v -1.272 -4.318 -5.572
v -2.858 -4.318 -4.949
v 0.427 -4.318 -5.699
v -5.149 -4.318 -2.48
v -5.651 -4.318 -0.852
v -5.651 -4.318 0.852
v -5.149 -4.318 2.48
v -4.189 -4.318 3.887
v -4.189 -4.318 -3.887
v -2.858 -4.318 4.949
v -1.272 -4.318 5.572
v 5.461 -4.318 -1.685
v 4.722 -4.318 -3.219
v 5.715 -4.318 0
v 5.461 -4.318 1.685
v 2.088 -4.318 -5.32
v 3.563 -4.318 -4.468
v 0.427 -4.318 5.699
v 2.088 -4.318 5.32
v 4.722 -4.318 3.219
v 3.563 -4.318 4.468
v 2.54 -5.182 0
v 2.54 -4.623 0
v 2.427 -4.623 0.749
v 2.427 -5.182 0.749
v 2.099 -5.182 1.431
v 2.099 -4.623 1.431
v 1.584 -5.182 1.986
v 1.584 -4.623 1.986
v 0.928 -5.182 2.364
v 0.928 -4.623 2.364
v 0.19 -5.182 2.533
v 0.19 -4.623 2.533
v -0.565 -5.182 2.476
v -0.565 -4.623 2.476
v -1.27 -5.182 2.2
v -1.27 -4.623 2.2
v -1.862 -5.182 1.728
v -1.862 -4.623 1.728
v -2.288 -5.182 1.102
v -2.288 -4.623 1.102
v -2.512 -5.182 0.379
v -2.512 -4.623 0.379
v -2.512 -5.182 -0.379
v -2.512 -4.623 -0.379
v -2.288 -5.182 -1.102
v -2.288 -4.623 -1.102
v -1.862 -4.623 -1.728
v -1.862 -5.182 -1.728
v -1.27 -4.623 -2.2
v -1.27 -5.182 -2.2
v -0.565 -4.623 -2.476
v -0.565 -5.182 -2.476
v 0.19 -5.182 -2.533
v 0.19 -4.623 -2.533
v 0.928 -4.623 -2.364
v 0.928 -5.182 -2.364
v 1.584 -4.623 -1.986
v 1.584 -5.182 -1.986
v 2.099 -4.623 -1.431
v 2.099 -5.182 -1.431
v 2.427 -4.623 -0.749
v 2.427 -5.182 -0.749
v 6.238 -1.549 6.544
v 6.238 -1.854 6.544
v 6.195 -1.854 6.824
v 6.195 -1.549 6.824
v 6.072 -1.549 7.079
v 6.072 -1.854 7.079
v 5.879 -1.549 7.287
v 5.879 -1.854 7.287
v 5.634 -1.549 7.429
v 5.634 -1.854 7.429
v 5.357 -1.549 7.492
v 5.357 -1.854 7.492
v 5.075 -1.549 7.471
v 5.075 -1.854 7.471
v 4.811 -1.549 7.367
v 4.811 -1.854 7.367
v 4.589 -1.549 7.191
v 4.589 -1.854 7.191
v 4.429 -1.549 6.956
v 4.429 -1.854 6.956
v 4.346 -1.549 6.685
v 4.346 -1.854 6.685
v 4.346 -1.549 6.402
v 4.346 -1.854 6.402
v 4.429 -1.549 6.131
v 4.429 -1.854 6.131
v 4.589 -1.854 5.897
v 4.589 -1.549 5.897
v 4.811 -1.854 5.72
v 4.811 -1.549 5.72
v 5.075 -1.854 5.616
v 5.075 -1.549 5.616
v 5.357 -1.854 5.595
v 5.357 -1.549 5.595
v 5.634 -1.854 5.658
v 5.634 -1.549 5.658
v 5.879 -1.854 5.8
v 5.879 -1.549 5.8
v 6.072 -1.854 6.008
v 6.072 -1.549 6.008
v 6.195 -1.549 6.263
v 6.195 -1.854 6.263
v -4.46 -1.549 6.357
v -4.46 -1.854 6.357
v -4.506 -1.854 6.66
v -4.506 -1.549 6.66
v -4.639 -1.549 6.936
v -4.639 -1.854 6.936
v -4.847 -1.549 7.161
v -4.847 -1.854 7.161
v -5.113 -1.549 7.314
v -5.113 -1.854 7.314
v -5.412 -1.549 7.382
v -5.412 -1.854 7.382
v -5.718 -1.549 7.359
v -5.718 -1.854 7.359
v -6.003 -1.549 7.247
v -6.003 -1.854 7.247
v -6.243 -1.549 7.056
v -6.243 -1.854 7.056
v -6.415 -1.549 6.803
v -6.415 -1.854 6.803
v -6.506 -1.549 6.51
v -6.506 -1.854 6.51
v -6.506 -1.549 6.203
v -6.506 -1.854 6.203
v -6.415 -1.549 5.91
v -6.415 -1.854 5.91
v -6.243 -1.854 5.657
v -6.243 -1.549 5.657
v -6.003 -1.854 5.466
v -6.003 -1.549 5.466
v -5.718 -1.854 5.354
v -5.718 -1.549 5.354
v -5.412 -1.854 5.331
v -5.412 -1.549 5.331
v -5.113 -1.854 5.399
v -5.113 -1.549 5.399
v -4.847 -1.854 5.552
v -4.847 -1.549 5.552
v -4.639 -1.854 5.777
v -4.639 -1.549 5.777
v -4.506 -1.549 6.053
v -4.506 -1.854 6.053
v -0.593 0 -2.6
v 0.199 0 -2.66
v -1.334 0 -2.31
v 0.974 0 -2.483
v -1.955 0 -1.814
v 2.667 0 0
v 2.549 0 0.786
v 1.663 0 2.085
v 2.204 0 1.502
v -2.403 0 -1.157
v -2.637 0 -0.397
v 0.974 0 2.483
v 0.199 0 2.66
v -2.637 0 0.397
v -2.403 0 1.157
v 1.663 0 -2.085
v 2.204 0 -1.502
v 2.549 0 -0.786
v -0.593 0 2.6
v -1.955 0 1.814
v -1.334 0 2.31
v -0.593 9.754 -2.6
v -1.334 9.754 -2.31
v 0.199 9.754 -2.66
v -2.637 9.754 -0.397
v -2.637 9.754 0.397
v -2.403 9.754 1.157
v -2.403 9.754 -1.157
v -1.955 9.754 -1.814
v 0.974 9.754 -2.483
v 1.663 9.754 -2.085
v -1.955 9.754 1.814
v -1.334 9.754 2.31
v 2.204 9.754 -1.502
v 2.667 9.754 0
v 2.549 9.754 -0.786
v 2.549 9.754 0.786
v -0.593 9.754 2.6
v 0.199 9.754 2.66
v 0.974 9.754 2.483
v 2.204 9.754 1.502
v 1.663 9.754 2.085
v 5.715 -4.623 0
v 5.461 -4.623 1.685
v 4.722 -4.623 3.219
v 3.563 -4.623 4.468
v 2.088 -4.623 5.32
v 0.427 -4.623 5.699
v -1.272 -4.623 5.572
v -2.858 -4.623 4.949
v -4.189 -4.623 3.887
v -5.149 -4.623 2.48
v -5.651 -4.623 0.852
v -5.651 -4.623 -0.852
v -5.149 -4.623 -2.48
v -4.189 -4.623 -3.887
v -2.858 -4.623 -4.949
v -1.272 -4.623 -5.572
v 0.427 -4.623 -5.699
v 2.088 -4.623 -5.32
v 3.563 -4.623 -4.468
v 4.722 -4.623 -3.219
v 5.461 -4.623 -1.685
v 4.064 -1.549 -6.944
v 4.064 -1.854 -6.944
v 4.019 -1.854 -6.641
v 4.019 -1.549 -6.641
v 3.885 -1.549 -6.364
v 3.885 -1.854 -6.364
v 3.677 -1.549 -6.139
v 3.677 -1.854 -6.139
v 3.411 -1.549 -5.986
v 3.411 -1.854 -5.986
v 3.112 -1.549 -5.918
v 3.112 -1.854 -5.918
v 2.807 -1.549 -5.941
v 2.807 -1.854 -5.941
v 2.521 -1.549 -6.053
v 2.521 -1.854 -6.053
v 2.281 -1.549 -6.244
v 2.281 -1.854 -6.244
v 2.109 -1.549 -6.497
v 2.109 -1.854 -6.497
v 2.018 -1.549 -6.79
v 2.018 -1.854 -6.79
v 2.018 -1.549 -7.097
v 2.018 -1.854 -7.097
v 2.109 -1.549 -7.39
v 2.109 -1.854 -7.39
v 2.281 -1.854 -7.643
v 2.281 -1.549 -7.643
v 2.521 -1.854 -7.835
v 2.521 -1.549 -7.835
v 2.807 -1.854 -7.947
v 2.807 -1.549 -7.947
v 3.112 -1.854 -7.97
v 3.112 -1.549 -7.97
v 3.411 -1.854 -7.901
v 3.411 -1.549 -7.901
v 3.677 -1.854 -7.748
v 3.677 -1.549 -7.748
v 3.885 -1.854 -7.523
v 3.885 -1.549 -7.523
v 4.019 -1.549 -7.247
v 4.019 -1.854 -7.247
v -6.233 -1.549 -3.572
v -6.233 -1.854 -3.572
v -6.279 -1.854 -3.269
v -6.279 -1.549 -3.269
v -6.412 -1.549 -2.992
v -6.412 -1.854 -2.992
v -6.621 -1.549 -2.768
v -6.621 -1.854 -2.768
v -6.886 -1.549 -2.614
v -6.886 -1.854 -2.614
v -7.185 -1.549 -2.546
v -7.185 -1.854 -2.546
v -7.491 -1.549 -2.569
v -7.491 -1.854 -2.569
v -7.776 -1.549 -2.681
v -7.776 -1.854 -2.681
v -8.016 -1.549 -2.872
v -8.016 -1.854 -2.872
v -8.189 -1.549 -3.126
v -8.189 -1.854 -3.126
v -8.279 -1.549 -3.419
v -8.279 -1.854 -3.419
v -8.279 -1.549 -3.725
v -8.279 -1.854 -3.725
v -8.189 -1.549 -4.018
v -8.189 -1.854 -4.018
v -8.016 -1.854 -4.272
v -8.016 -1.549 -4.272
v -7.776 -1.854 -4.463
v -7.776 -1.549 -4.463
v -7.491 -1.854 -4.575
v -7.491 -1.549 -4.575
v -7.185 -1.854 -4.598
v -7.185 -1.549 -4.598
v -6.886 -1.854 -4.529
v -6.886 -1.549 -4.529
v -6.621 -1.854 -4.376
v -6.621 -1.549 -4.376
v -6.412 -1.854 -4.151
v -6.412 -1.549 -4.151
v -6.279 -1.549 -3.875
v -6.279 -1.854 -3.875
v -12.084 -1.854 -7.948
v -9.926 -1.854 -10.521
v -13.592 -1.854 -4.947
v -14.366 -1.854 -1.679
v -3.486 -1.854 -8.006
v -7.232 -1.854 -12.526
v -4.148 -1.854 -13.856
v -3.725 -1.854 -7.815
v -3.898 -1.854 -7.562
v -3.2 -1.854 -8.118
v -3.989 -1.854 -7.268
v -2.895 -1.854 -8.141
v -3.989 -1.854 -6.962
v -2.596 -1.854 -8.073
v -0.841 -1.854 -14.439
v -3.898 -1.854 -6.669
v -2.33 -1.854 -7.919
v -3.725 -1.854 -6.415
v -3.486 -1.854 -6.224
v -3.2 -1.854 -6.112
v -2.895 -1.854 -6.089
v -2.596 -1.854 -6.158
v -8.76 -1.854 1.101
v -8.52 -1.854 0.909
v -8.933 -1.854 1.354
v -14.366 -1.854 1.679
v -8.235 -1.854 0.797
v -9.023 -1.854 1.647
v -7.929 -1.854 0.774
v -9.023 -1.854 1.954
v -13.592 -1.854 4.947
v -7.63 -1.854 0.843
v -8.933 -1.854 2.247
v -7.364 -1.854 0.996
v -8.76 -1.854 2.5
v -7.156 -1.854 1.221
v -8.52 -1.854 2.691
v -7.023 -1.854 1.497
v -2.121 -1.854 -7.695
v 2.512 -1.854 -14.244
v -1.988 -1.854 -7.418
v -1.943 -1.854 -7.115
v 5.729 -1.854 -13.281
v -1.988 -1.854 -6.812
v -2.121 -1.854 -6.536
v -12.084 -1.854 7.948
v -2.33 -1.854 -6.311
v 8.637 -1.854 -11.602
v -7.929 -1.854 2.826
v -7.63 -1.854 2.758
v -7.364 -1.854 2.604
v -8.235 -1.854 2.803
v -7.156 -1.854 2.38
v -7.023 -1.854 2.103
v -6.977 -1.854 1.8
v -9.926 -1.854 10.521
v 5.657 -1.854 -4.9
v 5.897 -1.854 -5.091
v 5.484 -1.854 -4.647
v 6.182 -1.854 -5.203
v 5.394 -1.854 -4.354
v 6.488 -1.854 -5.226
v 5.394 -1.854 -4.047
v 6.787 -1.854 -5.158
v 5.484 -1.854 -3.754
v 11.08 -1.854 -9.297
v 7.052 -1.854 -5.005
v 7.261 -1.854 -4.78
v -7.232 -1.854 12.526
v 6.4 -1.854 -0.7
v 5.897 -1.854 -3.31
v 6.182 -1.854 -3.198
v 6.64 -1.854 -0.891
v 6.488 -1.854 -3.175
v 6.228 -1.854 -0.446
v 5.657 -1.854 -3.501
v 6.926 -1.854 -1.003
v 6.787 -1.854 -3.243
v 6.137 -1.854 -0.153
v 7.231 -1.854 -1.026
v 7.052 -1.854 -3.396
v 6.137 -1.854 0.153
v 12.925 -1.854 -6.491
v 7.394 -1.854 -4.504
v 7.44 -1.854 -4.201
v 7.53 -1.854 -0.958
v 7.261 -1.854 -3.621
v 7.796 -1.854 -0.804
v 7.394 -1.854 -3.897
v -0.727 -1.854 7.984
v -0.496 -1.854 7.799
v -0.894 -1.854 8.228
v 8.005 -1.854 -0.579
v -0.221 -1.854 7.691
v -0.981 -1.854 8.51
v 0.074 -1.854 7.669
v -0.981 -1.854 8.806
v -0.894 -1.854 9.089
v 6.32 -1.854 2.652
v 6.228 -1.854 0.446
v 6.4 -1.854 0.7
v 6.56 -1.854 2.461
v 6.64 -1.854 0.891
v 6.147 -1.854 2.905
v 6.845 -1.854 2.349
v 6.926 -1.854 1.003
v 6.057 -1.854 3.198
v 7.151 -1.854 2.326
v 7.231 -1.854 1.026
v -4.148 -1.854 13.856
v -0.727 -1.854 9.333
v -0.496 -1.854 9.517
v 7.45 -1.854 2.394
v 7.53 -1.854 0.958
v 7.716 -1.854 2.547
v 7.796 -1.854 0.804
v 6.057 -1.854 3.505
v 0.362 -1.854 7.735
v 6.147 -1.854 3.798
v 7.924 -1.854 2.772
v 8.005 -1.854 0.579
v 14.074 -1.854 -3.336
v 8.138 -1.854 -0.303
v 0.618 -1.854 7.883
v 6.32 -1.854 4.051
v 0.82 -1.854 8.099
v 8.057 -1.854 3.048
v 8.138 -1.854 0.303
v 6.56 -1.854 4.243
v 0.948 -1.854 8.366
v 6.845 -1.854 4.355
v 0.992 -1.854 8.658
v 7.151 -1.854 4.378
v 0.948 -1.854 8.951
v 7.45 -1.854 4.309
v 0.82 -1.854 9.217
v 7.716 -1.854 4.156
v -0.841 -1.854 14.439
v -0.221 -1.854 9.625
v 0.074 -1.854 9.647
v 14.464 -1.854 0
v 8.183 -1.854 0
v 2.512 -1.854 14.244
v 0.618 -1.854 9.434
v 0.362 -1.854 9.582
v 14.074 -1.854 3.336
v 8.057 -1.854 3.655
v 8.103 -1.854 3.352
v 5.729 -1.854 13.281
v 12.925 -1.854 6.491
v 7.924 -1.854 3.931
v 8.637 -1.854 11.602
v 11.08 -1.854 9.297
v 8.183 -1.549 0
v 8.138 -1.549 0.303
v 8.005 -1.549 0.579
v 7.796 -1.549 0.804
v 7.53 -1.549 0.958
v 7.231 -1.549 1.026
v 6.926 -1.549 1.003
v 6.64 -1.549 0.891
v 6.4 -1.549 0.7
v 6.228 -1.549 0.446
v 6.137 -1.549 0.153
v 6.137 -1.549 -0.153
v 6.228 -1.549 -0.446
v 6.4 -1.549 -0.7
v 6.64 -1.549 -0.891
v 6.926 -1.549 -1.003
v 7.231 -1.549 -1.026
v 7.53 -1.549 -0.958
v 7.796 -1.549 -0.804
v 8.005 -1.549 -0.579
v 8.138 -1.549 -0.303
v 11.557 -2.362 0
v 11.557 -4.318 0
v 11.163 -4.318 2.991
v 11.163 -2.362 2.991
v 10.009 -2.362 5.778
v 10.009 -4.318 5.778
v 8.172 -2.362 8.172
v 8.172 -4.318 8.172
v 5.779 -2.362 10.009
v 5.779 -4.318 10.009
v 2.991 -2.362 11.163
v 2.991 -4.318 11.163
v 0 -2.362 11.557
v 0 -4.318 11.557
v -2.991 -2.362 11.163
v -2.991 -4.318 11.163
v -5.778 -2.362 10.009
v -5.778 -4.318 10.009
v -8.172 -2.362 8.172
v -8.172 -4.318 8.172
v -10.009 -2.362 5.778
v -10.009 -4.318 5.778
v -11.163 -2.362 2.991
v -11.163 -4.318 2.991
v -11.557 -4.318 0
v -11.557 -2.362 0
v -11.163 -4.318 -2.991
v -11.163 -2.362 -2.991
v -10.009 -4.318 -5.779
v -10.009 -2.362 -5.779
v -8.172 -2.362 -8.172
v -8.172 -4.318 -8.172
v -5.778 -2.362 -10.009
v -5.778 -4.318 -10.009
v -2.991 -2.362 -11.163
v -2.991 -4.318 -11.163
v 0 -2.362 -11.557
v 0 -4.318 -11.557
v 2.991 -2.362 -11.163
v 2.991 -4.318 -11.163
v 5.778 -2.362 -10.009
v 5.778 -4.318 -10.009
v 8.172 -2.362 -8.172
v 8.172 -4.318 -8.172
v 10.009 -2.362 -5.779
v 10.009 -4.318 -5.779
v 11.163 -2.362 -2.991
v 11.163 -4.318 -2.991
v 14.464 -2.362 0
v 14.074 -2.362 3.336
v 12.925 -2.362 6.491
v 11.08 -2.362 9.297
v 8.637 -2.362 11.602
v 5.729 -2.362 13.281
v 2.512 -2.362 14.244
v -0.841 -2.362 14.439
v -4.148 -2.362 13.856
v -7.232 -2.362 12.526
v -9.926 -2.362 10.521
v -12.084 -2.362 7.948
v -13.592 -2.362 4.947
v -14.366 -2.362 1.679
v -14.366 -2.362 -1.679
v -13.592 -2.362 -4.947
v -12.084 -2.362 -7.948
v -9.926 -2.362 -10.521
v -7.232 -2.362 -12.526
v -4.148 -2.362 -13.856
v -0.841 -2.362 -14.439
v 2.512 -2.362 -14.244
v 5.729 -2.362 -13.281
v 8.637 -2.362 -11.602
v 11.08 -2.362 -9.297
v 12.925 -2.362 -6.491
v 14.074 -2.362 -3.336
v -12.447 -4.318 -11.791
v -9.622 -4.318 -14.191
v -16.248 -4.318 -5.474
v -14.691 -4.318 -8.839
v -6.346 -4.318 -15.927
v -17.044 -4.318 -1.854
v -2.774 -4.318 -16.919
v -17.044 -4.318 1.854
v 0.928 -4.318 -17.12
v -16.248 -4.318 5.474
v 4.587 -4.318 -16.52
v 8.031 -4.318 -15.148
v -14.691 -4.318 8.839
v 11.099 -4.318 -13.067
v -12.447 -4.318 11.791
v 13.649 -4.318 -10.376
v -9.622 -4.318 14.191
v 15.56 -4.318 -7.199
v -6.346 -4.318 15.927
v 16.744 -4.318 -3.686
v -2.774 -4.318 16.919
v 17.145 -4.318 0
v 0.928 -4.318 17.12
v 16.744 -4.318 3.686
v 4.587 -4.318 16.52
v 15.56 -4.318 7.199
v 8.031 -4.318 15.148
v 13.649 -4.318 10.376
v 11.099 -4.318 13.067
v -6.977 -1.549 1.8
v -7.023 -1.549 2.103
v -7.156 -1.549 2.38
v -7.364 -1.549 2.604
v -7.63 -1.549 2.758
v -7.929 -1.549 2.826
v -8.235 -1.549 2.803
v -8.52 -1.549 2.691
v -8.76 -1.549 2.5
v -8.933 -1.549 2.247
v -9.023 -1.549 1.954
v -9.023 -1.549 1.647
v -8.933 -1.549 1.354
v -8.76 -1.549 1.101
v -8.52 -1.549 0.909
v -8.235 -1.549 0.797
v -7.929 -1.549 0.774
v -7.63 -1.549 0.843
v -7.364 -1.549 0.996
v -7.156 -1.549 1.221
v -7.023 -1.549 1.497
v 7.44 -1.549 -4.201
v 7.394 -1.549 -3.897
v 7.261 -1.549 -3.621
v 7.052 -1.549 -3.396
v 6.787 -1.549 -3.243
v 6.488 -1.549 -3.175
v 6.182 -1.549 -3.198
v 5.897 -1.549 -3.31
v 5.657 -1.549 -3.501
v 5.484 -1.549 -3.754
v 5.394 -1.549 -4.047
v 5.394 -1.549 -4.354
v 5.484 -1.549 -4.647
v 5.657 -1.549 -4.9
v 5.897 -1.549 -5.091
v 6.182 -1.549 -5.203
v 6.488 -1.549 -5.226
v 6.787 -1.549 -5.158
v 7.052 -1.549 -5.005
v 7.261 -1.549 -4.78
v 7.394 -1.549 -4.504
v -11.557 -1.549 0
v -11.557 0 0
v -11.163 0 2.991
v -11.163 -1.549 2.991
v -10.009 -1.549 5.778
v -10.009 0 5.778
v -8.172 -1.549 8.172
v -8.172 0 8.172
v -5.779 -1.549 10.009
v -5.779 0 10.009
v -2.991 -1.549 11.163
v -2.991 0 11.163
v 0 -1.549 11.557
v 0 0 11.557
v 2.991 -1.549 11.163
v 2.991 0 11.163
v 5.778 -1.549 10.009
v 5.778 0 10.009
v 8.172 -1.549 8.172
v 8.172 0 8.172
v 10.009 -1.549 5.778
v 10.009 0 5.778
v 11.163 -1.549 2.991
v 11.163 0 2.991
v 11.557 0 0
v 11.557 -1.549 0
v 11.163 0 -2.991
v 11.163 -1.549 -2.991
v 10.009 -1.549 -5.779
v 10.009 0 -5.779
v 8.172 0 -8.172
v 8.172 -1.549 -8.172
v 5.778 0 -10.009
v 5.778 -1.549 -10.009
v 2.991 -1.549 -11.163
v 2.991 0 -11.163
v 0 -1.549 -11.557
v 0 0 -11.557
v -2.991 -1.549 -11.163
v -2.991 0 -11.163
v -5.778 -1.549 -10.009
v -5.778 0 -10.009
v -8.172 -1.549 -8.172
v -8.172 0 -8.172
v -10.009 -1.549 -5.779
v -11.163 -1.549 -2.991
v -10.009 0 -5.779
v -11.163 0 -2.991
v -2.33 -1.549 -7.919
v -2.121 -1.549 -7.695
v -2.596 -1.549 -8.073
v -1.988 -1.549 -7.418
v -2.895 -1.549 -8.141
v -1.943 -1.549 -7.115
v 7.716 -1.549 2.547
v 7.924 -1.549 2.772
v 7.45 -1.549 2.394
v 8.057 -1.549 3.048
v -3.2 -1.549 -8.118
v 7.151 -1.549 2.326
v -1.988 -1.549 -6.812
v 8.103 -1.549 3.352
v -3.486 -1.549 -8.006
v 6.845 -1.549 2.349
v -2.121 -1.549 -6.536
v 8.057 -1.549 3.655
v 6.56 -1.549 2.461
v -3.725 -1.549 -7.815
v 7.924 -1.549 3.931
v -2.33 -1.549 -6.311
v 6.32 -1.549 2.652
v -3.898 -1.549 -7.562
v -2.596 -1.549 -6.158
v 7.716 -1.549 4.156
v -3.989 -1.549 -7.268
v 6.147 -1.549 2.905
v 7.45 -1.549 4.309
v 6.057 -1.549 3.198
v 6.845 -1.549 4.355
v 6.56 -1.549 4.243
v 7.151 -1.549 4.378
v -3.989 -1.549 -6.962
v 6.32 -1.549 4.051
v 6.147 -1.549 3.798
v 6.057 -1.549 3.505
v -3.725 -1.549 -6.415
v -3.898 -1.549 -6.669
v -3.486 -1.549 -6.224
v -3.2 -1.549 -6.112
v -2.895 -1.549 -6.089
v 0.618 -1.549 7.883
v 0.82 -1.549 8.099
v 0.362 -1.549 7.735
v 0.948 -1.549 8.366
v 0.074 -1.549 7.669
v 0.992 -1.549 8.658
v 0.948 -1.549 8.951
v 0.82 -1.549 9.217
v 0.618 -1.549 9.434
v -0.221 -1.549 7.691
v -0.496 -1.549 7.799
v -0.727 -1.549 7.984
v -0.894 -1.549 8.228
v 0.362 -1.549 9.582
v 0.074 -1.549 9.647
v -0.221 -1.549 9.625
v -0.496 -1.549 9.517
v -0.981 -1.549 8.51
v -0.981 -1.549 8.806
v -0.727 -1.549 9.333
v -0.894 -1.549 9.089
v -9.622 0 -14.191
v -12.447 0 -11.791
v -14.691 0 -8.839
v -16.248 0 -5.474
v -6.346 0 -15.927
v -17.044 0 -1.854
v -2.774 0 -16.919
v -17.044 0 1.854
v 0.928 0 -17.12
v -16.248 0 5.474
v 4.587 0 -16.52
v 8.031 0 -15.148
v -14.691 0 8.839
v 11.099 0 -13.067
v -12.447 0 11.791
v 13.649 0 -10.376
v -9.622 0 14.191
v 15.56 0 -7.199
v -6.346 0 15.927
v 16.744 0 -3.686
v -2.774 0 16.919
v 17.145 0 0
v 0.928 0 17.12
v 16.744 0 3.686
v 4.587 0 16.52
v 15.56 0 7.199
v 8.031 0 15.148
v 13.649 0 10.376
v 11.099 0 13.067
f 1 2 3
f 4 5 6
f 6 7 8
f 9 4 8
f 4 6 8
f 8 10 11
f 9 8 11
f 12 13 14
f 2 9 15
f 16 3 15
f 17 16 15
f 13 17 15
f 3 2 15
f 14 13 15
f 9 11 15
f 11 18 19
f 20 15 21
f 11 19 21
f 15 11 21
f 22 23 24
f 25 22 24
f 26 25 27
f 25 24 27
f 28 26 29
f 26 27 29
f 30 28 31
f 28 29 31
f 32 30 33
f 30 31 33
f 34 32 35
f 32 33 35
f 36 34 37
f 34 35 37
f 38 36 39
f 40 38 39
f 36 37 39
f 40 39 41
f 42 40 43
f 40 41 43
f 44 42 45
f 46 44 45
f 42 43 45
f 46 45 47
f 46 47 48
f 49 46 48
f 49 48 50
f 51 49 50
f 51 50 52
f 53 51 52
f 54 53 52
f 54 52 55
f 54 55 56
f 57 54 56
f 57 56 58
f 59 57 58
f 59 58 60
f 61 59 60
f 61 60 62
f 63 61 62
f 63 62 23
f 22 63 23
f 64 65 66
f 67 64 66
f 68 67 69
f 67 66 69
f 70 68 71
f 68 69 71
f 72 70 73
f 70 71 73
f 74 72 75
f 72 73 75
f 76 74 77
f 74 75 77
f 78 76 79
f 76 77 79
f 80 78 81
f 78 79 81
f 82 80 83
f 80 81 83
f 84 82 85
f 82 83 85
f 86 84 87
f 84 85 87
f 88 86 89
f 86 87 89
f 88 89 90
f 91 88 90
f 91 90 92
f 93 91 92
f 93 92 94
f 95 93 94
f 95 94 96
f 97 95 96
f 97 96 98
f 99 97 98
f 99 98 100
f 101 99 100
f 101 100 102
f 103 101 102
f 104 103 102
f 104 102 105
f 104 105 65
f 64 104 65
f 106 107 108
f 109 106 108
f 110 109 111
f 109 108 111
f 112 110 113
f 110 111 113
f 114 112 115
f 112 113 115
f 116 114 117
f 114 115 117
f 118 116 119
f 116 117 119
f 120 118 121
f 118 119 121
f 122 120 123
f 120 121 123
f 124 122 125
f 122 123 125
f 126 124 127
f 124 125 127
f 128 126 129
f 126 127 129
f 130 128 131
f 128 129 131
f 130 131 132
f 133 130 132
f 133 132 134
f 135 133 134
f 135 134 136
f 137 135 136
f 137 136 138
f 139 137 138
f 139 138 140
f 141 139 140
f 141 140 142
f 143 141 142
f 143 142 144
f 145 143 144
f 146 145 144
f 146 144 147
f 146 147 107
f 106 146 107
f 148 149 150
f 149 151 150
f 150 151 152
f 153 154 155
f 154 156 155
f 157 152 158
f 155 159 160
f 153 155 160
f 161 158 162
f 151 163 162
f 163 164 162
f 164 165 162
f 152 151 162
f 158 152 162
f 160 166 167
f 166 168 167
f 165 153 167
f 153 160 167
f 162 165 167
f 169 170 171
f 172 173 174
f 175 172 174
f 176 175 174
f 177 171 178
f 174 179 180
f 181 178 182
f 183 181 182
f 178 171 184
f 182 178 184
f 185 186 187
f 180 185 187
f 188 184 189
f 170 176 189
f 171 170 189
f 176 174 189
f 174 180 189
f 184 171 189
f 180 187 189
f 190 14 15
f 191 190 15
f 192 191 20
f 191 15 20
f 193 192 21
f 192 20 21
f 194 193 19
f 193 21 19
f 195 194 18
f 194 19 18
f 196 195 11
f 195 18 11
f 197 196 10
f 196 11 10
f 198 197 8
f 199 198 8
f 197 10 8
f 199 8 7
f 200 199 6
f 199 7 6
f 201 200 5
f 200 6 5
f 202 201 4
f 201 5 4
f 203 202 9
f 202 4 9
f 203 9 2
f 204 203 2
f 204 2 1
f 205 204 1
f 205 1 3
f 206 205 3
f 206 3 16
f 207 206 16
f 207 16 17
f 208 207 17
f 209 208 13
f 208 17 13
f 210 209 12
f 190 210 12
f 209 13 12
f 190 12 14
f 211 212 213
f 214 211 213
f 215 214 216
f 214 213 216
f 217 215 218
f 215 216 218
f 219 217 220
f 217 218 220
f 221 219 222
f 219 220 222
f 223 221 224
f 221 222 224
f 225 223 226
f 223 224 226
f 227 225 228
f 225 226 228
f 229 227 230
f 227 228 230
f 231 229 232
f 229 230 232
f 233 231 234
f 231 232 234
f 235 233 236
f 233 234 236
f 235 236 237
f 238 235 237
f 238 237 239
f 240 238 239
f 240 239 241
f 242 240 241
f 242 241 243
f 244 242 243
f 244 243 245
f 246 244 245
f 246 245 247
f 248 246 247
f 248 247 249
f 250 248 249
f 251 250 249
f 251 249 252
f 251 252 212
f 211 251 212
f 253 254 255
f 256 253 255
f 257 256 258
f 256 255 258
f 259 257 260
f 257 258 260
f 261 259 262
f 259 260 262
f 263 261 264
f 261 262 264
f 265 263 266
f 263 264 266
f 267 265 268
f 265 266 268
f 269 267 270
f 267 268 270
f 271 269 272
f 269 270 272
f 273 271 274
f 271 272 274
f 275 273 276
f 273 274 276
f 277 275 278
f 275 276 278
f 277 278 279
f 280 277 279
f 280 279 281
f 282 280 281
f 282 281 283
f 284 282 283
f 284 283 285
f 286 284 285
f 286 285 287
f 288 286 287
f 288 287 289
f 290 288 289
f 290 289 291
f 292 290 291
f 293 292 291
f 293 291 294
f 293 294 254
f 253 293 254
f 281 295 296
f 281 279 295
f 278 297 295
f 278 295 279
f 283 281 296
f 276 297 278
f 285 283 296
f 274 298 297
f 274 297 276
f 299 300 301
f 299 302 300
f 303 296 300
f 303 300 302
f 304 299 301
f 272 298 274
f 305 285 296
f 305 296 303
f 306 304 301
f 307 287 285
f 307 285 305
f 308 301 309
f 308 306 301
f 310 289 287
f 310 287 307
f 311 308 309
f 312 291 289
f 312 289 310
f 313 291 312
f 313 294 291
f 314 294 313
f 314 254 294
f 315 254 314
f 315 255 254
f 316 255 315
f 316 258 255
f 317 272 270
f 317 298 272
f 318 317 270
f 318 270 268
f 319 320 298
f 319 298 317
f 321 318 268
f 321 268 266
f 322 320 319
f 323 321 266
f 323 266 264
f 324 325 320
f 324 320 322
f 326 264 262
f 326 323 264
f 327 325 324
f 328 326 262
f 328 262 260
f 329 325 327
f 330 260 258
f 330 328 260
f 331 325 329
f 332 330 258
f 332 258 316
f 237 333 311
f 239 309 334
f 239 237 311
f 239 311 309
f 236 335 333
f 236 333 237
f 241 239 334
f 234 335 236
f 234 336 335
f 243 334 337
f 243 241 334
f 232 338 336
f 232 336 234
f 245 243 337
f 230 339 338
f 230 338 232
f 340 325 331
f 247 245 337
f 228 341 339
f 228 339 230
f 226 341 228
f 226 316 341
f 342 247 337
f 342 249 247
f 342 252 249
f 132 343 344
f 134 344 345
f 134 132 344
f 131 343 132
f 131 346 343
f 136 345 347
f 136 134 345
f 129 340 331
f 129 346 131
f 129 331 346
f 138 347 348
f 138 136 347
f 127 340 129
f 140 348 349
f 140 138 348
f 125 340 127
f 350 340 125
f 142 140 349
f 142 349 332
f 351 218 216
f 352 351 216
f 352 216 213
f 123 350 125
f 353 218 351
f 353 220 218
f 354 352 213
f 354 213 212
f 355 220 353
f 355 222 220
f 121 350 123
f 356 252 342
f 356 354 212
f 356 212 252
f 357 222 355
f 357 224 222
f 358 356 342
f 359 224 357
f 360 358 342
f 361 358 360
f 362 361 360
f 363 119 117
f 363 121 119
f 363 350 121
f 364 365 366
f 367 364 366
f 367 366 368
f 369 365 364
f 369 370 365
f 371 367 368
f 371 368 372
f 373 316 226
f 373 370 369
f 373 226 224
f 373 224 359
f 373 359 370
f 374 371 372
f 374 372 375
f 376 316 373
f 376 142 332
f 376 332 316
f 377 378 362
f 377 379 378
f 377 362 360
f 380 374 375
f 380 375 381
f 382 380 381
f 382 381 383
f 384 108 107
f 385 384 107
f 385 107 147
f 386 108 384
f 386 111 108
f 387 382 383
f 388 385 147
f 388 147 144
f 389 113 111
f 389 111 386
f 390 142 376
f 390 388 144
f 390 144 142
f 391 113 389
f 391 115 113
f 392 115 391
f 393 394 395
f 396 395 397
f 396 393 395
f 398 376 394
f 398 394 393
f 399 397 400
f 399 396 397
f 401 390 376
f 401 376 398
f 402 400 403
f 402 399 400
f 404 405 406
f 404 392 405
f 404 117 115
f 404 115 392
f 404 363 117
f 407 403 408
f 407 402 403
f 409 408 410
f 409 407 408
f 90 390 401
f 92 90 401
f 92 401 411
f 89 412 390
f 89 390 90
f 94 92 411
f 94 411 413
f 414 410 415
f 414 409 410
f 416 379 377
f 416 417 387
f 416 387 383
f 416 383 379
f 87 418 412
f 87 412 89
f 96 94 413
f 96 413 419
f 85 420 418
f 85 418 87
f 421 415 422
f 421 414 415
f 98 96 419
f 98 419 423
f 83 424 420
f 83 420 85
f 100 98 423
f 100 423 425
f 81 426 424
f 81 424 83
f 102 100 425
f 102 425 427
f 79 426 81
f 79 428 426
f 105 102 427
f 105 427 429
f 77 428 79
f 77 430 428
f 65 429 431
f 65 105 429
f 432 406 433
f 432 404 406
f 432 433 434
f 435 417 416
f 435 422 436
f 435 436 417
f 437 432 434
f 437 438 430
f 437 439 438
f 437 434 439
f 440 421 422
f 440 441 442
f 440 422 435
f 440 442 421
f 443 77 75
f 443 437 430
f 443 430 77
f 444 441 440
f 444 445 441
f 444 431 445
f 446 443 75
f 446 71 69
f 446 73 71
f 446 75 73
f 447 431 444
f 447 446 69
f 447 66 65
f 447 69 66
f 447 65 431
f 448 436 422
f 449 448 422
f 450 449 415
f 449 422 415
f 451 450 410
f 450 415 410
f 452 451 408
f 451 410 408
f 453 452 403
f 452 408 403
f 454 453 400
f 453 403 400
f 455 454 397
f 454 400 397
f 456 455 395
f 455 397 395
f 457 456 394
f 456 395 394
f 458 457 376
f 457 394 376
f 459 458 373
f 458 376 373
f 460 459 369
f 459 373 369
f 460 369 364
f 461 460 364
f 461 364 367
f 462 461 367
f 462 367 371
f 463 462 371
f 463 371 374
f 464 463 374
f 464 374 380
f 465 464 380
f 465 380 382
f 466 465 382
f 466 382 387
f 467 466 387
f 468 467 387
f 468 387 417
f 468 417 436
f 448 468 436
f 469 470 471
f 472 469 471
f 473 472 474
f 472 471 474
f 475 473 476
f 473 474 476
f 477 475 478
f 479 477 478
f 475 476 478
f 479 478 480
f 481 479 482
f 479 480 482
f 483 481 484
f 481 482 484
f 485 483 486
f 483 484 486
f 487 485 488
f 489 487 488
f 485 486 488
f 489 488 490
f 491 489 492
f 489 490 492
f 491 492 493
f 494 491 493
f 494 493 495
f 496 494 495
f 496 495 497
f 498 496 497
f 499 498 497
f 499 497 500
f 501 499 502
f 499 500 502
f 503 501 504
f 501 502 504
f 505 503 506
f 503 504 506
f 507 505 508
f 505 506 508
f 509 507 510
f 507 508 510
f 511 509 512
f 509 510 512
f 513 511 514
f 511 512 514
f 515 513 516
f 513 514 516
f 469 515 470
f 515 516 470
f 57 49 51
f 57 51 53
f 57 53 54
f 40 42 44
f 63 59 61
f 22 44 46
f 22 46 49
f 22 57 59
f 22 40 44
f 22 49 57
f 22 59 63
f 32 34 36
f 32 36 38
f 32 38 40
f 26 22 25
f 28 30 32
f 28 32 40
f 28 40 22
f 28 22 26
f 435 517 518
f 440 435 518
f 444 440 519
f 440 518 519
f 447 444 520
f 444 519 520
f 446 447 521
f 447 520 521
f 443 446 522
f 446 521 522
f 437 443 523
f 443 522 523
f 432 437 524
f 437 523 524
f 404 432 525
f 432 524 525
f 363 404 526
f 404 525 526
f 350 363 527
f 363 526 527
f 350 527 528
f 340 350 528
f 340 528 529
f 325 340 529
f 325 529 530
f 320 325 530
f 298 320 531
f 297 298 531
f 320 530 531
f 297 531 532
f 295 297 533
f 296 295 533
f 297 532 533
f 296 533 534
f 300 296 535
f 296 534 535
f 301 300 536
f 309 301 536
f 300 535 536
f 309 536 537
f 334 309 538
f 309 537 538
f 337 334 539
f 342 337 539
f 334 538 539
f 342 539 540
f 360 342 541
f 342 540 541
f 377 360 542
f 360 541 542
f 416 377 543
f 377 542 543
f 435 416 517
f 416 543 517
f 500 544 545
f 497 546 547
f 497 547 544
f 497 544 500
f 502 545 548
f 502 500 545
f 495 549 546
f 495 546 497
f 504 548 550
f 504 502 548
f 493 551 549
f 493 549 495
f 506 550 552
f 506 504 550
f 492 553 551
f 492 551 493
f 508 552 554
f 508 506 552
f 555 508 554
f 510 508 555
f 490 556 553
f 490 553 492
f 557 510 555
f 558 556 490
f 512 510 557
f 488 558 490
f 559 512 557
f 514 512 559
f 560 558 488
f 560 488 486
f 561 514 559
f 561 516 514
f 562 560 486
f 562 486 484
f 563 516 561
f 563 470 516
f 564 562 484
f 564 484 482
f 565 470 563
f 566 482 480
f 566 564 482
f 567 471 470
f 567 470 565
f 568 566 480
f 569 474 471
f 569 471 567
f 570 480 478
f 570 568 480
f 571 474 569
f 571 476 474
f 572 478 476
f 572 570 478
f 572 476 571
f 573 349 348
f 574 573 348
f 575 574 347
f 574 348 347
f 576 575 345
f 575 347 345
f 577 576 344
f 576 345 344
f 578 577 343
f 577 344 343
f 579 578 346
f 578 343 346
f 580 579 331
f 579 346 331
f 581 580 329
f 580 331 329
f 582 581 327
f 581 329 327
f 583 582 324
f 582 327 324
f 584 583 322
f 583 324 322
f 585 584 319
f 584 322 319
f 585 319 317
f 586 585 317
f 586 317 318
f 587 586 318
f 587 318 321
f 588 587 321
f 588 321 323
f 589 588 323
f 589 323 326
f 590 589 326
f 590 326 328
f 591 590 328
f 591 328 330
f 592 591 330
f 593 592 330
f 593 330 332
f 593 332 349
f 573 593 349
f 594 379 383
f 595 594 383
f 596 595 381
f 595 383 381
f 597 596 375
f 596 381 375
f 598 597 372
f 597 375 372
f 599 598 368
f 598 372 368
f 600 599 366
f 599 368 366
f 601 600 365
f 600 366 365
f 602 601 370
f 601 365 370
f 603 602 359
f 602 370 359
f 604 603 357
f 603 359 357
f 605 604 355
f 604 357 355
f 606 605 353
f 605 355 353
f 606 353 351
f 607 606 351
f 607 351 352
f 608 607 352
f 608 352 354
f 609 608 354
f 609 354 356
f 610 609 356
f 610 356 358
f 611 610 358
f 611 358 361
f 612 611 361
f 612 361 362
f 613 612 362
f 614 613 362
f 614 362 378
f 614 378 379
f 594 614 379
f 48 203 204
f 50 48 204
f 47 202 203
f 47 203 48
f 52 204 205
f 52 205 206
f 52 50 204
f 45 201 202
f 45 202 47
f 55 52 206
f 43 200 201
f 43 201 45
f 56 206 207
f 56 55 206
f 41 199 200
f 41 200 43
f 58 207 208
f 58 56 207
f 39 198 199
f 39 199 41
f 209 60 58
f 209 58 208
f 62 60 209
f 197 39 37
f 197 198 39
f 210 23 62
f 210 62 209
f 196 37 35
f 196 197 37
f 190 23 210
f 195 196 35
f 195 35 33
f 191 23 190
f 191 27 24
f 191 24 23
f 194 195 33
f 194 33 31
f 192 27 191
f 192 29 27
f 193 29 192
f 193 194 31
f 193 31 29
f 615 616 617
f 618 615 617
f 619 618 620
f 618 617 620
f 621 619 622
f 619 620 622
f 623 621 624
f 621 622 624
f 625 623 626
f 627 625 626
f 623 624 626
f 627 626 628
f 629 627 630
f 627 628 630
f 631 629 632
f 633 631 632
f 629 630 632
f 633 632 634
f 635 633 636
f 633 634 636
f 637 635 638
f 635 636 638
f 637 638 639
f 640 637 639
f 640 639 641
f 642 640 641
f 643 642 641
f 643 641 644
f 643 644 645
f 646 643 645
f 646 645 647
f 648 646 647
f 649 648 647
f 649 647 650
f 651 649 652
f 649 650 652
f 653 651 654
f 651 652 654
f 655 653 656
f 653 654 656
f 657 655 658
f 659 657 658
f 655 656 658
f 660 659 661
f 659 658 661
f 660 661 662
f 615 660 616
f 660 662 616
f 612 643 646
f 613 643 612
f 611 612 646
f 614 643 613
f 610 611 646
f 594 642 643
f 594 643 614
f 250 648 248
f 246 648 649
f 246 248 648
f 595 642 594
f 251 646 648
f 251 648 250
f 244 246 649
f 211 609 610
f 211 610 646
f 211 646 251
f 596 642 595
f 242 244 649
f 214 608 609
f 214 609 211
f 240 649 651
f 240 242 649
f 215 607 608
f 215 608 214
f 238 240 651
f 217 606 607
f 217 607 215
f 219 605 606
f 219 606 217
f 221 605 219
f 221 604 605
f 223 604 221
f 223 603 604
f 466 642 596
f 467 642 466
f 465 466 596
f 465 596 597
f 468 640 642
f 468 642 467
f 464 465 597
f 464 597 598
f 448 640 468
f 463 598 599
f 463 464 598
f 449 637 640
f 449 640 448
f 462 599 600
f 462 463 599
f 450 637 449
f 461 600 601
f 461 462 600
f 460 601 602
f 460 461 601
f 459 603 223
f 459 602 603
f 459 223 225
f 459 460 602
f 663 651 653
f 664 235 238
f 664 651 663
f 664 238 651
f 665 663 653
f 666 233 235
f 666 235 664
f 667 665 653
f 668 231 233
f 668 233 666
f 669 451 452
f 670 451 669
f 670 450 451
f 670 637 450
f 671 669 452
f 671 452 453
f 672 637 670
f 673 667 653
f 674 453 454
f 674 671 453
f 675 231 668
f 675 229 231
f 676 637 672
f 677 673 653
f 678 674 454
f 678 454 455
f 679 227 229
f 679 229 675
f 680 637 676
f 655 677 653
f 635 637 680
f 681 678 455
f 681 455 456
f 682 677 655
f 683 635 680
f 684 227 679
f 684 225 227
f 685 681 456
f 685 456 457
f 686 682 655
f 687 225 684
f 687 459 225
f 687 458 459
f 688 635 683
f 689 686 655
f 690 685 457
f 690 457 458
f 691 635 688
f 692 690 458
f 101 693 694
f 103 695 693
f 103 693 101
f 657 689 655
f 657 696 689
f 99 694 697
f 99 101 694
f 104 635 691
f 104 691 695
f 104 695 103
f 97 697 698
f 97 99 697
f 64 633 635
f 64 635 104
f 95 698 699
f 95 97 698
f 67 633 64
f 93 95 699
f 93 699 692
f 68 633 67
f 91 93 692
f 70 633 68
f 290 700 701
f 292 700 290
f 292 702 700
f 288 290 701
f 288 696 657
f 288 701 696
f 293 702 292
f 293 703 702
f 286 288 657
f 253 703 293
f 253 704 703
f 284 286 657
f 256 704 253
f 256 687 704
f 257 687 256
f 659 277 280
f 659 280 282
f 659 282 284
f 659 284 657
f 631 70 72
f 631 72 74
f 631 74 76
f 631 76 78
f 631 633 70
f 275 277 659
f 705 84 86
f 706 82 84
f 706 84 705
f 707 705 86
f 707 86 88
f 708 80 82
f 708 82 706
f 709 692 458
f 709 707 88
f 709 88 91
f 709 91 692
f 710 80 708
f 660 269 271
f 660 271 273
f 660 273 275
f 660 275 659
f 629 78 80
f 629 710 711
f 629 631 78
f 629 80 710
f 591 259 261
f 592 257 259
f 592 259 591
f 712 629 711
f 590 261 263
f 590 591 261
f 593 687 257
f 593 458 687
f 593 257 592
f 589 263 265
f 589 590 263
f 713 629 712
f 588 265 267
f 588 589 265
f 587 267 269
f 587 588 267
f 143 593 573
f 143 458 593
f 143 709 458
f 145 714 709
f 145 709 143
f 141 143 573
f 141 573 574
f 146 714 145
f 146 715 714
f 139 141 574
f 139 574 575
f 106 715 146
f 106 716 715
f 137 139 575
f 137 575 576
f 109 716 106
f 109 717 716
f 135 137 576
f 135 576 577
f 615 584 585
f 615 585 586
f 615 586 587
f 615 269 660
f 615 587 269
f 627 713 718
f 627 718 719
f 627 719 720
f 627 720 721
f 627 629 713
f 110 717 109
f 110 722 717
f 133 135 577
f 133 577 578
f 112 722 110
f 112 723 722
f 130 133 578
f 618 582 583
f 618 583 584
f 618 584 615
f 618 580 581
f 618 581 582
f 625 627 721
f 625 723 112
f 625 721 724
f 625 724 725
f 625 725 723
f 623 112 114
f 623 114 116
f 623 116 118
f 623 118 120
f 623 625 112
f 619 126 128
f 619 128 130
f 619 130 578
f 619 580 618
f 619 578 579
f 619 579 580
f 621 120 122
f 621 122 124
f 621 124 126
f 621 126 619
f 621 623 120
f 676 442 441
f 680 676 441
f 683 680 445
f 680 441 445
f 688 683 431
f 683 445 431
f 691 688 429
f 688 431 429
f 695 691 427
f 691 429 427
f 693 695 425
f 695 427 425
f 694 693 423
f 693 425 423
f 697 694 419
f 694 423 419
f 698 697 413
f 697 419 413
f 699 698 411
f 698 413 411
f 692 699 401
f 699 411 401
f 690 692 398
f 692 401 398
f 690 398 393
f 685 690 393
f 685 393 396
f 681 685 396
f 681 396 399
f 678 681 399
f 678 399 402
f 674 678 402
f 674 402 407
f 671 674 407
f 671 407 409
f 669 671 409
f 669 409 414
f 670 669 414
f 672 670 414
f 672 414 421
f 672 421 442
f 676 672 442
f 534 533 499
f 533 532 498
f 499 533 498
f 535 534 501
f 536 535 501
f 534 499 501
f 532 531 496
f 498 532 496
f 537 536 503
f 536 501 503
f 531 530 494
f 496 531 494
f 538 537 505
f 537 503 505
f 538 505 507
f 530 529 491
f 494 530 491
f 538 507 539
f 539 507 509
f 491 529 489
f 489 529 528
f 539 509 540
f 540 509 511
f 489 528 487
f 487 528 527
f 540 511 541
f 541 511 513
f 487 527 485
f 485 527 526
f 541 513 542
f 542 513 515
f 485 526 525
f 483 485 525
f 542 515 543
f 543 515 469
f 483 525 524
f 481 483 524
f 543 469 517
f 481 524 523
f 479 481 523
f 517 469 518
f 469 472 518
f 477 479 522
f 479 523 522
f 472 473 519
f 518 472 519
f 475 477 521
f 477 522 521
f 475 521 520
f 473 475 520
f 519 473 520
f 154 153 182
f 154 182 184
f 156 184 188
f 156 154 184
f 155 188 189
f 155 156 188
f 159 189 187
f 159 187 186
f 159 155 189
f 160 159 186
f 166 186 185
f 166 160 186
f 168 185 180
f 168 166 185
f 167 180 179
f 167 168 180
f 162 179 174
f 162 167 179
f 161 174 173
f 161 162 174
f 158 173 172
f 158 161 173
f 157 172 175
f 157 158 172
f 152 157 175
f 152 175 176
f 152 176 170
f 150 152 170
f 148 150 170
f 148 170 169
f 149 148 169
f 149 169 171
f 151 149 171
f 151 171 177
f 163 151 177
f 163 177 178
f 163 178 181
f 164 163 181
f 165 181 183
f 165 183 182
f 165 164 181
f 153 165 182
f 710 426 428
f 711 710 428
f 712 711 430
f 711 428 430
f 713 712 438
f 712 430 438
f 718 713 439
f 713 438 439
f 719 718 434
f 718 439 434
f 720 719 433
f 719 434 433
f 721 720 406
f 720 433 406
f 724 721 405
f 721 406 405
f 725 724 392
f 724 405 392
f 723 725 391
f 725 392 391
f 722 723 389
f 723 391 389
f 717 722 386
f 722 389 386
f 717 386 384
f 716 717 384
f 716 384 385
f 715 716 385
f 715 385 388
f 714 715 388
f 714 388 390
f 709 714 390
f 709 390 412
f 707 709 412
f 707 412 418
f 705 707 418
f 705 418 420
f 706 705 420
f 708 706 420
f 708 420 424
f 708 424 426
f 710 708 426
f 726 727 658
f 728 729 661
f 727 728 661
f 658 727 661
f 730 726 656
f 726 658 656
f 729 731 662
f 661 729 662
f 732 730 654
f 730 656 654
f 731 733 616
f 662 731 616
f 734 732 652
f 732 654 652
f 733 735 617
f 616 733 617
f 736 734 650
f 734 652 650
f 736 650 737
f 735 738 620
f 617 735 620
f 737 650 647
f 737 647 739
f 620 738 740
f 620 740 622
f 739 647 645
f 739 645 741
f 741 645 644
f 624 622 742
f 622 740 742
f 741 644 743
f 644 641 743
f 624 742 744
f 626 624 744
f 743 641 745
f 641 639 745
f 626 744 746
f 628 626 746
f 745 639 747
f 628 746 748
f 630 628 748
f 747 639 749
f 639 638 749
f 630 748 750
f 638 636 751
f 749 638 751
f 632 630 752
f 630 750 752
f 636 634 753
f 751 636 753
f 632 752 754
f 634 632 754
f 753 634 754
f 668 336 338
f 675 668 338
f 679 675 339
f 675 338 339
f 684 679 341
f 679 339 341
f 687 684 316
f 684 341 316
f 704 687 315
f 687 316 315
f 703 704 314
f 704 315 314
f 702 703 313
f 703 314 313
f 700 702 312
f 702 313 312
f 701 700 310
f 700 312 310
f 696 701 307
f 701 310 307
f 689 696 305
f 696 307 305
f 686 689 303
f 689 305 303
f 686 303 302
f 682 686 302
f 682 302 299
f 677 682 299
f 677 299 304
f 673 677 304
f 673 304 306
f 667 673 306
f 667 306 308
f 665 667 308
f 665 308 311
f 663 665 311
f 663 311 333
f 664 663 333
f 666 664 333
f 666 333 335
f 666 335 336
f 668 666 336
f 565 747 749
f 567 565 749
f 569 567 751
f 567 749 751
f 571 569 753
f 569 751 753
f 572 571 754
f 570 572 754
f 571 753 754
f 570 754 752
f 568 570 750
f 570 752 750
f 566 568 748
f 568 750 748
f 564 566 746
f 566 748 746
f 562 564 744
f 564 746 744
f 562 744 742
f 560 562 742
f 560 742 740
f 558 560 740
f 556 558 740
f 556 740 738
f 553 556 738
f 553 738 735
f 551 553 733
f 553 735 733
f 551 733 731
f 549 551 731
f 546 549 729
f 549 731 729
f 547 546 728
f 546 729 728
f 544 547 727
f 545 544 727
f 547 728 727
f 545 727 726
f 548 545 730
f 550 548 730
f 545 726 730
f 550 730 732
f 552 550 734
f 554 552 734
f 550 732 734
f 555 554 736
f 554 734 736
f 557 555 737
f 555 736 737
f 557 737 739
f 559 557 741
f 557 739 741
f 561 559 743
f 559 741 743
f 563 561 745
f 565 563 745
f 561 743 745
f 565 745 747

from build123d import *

# Parameters (mm, degrees)
F0_R      = 17.145
F1_DEPTH  = 4.318
F2_R      = 2.667
F3_DEPTH  = 9.7536
F4_R      = 2.54
F5_DEPTH  = 0.8636
F6_R      = 5.715
F7_DEPTH  = 0.3048
F8_R      = 11.557
F9_DEPTH  = 1.9558
F10_R     = 14.4638625387
F11_DEPTH = 0.508
F12_R     = 0.9919276493
F13_DEPTH = 35.4076
F14_R     = 11.557
F15_DEPTH = 1.5494
F18_R     = 0.9511664252
F19_DEPTH = 25.4
F20_R     = 1.0287
F21_DEPTH = 25.4
F22_R     = 1.0287
F23_DEPTH = 25.4


# Not quite as in the source:
# - the program builds the solid bodies; features that only make, move or delete a surface that nothing else refers to are left out


with BuildPart() as f1:
    # F0 (on Front) → F1 (new body)
    with BuildSketch(Plane.XZ):
        Circle(F0_R)
    extrude(amount=F1_DEPTH)

    # F2 (on Front) → F3 (join)
    with BuildSketch(Plane.XZ):
        Circle(F2_R)
    extrude(amount=-F3_DEPTH)

    # F4 (on face) → F5 (join)
    with BuildSketch(Plane.XZ.offset(4.318)):
        Circle(F4_R)
    extrude(amount=F5_DEPTH)

    # F6 (on face) → F7 (join)
    with BuildSketch(Plane.XZ.offset(4.318)):
        Circle(F6_R)
    extrude(amount=F7_DEPTH)

    # F8 (on face) → F9 (cut)
    with BuildSketch(Plane.XZ.offset(4.318)):
        Circle(F8_R)
    extrude(amount=-F9_DEPTH, mode=Mode.SUBTRACT)

    # F10 (on face) → F11 (cut)
    with BuildSketch(Plane.XZ.offset(2.3622)):
        Circle(F10_R)
    extrude(amount=-F11_DEPTH, mode=Mode.SUBTRACT)

    # F12 (on face) → F13 (cut)
    with BuildSketch(Plane.XZ.offset(4.318)):
        with Locations((0, 8.6582256481)):
            Circle(F12_R)
    extrude(amount=-F13_DEPTH, mode=Mode.SUBTRACT)

    # F14 (on face) → F15 (cut)
    with BuildSketch(Plane(origin=(0, 0, 0), x_dir=(-1, 0, 0), z_dir=(0, 1, 0))):
        Circle(F14_R)
    extrude(amount=-F15_DEPTH, mode=Mode.SUBTRACT)

    # F18 (on face) → F19 (cut)
    with BuildSketch(Plane.XZ.offset(4.318)):
        with Locations((5.286374595, 6.5436754376)):
            Circle(F18_R)
    extrude(amount=-F19_DEPTH, mode=Mode.SUBTRACT)

    # F20 (on face) → F21 (cut)
    with BuildSketch(Plane.XZ.offset(4.318)):
        with Locations((-8.0057960004, 1.8002251163)):
            Circle(F20_R)
        with Locations((-7.2620785795, -3.5718751606)):
            Circle(F20_R)
        with Locations((-2.9714044649, -7.1151754819)):
            Circle(F20_R)
        with Locations((3.035539994, -6.9437255152)):
            Circle(F20_R)
        with Locations((6.4108707011, -4.2005251162)):
            Circle(F20_R)
        with Locations((7.1545867249, 0)):
            Circle(F20_R)
        with Locations((7.0742800182, 3.3516884295)):
            Circle(F20_R)
    extrude(amount=-F21_DEPTH, mode=Mode.SUBTRACT)

    # F22 (on face) → F23 (cut)
    with BuildSketch(Plane.XZ.offset(4.318)):
        with Locations((-5.4886001162, 6.3565419987)):
            Circle(F22_R)
    extrude(amount=-F23_DEPTH, mode=Mode.SUBTRACT)


solid = f1.part
